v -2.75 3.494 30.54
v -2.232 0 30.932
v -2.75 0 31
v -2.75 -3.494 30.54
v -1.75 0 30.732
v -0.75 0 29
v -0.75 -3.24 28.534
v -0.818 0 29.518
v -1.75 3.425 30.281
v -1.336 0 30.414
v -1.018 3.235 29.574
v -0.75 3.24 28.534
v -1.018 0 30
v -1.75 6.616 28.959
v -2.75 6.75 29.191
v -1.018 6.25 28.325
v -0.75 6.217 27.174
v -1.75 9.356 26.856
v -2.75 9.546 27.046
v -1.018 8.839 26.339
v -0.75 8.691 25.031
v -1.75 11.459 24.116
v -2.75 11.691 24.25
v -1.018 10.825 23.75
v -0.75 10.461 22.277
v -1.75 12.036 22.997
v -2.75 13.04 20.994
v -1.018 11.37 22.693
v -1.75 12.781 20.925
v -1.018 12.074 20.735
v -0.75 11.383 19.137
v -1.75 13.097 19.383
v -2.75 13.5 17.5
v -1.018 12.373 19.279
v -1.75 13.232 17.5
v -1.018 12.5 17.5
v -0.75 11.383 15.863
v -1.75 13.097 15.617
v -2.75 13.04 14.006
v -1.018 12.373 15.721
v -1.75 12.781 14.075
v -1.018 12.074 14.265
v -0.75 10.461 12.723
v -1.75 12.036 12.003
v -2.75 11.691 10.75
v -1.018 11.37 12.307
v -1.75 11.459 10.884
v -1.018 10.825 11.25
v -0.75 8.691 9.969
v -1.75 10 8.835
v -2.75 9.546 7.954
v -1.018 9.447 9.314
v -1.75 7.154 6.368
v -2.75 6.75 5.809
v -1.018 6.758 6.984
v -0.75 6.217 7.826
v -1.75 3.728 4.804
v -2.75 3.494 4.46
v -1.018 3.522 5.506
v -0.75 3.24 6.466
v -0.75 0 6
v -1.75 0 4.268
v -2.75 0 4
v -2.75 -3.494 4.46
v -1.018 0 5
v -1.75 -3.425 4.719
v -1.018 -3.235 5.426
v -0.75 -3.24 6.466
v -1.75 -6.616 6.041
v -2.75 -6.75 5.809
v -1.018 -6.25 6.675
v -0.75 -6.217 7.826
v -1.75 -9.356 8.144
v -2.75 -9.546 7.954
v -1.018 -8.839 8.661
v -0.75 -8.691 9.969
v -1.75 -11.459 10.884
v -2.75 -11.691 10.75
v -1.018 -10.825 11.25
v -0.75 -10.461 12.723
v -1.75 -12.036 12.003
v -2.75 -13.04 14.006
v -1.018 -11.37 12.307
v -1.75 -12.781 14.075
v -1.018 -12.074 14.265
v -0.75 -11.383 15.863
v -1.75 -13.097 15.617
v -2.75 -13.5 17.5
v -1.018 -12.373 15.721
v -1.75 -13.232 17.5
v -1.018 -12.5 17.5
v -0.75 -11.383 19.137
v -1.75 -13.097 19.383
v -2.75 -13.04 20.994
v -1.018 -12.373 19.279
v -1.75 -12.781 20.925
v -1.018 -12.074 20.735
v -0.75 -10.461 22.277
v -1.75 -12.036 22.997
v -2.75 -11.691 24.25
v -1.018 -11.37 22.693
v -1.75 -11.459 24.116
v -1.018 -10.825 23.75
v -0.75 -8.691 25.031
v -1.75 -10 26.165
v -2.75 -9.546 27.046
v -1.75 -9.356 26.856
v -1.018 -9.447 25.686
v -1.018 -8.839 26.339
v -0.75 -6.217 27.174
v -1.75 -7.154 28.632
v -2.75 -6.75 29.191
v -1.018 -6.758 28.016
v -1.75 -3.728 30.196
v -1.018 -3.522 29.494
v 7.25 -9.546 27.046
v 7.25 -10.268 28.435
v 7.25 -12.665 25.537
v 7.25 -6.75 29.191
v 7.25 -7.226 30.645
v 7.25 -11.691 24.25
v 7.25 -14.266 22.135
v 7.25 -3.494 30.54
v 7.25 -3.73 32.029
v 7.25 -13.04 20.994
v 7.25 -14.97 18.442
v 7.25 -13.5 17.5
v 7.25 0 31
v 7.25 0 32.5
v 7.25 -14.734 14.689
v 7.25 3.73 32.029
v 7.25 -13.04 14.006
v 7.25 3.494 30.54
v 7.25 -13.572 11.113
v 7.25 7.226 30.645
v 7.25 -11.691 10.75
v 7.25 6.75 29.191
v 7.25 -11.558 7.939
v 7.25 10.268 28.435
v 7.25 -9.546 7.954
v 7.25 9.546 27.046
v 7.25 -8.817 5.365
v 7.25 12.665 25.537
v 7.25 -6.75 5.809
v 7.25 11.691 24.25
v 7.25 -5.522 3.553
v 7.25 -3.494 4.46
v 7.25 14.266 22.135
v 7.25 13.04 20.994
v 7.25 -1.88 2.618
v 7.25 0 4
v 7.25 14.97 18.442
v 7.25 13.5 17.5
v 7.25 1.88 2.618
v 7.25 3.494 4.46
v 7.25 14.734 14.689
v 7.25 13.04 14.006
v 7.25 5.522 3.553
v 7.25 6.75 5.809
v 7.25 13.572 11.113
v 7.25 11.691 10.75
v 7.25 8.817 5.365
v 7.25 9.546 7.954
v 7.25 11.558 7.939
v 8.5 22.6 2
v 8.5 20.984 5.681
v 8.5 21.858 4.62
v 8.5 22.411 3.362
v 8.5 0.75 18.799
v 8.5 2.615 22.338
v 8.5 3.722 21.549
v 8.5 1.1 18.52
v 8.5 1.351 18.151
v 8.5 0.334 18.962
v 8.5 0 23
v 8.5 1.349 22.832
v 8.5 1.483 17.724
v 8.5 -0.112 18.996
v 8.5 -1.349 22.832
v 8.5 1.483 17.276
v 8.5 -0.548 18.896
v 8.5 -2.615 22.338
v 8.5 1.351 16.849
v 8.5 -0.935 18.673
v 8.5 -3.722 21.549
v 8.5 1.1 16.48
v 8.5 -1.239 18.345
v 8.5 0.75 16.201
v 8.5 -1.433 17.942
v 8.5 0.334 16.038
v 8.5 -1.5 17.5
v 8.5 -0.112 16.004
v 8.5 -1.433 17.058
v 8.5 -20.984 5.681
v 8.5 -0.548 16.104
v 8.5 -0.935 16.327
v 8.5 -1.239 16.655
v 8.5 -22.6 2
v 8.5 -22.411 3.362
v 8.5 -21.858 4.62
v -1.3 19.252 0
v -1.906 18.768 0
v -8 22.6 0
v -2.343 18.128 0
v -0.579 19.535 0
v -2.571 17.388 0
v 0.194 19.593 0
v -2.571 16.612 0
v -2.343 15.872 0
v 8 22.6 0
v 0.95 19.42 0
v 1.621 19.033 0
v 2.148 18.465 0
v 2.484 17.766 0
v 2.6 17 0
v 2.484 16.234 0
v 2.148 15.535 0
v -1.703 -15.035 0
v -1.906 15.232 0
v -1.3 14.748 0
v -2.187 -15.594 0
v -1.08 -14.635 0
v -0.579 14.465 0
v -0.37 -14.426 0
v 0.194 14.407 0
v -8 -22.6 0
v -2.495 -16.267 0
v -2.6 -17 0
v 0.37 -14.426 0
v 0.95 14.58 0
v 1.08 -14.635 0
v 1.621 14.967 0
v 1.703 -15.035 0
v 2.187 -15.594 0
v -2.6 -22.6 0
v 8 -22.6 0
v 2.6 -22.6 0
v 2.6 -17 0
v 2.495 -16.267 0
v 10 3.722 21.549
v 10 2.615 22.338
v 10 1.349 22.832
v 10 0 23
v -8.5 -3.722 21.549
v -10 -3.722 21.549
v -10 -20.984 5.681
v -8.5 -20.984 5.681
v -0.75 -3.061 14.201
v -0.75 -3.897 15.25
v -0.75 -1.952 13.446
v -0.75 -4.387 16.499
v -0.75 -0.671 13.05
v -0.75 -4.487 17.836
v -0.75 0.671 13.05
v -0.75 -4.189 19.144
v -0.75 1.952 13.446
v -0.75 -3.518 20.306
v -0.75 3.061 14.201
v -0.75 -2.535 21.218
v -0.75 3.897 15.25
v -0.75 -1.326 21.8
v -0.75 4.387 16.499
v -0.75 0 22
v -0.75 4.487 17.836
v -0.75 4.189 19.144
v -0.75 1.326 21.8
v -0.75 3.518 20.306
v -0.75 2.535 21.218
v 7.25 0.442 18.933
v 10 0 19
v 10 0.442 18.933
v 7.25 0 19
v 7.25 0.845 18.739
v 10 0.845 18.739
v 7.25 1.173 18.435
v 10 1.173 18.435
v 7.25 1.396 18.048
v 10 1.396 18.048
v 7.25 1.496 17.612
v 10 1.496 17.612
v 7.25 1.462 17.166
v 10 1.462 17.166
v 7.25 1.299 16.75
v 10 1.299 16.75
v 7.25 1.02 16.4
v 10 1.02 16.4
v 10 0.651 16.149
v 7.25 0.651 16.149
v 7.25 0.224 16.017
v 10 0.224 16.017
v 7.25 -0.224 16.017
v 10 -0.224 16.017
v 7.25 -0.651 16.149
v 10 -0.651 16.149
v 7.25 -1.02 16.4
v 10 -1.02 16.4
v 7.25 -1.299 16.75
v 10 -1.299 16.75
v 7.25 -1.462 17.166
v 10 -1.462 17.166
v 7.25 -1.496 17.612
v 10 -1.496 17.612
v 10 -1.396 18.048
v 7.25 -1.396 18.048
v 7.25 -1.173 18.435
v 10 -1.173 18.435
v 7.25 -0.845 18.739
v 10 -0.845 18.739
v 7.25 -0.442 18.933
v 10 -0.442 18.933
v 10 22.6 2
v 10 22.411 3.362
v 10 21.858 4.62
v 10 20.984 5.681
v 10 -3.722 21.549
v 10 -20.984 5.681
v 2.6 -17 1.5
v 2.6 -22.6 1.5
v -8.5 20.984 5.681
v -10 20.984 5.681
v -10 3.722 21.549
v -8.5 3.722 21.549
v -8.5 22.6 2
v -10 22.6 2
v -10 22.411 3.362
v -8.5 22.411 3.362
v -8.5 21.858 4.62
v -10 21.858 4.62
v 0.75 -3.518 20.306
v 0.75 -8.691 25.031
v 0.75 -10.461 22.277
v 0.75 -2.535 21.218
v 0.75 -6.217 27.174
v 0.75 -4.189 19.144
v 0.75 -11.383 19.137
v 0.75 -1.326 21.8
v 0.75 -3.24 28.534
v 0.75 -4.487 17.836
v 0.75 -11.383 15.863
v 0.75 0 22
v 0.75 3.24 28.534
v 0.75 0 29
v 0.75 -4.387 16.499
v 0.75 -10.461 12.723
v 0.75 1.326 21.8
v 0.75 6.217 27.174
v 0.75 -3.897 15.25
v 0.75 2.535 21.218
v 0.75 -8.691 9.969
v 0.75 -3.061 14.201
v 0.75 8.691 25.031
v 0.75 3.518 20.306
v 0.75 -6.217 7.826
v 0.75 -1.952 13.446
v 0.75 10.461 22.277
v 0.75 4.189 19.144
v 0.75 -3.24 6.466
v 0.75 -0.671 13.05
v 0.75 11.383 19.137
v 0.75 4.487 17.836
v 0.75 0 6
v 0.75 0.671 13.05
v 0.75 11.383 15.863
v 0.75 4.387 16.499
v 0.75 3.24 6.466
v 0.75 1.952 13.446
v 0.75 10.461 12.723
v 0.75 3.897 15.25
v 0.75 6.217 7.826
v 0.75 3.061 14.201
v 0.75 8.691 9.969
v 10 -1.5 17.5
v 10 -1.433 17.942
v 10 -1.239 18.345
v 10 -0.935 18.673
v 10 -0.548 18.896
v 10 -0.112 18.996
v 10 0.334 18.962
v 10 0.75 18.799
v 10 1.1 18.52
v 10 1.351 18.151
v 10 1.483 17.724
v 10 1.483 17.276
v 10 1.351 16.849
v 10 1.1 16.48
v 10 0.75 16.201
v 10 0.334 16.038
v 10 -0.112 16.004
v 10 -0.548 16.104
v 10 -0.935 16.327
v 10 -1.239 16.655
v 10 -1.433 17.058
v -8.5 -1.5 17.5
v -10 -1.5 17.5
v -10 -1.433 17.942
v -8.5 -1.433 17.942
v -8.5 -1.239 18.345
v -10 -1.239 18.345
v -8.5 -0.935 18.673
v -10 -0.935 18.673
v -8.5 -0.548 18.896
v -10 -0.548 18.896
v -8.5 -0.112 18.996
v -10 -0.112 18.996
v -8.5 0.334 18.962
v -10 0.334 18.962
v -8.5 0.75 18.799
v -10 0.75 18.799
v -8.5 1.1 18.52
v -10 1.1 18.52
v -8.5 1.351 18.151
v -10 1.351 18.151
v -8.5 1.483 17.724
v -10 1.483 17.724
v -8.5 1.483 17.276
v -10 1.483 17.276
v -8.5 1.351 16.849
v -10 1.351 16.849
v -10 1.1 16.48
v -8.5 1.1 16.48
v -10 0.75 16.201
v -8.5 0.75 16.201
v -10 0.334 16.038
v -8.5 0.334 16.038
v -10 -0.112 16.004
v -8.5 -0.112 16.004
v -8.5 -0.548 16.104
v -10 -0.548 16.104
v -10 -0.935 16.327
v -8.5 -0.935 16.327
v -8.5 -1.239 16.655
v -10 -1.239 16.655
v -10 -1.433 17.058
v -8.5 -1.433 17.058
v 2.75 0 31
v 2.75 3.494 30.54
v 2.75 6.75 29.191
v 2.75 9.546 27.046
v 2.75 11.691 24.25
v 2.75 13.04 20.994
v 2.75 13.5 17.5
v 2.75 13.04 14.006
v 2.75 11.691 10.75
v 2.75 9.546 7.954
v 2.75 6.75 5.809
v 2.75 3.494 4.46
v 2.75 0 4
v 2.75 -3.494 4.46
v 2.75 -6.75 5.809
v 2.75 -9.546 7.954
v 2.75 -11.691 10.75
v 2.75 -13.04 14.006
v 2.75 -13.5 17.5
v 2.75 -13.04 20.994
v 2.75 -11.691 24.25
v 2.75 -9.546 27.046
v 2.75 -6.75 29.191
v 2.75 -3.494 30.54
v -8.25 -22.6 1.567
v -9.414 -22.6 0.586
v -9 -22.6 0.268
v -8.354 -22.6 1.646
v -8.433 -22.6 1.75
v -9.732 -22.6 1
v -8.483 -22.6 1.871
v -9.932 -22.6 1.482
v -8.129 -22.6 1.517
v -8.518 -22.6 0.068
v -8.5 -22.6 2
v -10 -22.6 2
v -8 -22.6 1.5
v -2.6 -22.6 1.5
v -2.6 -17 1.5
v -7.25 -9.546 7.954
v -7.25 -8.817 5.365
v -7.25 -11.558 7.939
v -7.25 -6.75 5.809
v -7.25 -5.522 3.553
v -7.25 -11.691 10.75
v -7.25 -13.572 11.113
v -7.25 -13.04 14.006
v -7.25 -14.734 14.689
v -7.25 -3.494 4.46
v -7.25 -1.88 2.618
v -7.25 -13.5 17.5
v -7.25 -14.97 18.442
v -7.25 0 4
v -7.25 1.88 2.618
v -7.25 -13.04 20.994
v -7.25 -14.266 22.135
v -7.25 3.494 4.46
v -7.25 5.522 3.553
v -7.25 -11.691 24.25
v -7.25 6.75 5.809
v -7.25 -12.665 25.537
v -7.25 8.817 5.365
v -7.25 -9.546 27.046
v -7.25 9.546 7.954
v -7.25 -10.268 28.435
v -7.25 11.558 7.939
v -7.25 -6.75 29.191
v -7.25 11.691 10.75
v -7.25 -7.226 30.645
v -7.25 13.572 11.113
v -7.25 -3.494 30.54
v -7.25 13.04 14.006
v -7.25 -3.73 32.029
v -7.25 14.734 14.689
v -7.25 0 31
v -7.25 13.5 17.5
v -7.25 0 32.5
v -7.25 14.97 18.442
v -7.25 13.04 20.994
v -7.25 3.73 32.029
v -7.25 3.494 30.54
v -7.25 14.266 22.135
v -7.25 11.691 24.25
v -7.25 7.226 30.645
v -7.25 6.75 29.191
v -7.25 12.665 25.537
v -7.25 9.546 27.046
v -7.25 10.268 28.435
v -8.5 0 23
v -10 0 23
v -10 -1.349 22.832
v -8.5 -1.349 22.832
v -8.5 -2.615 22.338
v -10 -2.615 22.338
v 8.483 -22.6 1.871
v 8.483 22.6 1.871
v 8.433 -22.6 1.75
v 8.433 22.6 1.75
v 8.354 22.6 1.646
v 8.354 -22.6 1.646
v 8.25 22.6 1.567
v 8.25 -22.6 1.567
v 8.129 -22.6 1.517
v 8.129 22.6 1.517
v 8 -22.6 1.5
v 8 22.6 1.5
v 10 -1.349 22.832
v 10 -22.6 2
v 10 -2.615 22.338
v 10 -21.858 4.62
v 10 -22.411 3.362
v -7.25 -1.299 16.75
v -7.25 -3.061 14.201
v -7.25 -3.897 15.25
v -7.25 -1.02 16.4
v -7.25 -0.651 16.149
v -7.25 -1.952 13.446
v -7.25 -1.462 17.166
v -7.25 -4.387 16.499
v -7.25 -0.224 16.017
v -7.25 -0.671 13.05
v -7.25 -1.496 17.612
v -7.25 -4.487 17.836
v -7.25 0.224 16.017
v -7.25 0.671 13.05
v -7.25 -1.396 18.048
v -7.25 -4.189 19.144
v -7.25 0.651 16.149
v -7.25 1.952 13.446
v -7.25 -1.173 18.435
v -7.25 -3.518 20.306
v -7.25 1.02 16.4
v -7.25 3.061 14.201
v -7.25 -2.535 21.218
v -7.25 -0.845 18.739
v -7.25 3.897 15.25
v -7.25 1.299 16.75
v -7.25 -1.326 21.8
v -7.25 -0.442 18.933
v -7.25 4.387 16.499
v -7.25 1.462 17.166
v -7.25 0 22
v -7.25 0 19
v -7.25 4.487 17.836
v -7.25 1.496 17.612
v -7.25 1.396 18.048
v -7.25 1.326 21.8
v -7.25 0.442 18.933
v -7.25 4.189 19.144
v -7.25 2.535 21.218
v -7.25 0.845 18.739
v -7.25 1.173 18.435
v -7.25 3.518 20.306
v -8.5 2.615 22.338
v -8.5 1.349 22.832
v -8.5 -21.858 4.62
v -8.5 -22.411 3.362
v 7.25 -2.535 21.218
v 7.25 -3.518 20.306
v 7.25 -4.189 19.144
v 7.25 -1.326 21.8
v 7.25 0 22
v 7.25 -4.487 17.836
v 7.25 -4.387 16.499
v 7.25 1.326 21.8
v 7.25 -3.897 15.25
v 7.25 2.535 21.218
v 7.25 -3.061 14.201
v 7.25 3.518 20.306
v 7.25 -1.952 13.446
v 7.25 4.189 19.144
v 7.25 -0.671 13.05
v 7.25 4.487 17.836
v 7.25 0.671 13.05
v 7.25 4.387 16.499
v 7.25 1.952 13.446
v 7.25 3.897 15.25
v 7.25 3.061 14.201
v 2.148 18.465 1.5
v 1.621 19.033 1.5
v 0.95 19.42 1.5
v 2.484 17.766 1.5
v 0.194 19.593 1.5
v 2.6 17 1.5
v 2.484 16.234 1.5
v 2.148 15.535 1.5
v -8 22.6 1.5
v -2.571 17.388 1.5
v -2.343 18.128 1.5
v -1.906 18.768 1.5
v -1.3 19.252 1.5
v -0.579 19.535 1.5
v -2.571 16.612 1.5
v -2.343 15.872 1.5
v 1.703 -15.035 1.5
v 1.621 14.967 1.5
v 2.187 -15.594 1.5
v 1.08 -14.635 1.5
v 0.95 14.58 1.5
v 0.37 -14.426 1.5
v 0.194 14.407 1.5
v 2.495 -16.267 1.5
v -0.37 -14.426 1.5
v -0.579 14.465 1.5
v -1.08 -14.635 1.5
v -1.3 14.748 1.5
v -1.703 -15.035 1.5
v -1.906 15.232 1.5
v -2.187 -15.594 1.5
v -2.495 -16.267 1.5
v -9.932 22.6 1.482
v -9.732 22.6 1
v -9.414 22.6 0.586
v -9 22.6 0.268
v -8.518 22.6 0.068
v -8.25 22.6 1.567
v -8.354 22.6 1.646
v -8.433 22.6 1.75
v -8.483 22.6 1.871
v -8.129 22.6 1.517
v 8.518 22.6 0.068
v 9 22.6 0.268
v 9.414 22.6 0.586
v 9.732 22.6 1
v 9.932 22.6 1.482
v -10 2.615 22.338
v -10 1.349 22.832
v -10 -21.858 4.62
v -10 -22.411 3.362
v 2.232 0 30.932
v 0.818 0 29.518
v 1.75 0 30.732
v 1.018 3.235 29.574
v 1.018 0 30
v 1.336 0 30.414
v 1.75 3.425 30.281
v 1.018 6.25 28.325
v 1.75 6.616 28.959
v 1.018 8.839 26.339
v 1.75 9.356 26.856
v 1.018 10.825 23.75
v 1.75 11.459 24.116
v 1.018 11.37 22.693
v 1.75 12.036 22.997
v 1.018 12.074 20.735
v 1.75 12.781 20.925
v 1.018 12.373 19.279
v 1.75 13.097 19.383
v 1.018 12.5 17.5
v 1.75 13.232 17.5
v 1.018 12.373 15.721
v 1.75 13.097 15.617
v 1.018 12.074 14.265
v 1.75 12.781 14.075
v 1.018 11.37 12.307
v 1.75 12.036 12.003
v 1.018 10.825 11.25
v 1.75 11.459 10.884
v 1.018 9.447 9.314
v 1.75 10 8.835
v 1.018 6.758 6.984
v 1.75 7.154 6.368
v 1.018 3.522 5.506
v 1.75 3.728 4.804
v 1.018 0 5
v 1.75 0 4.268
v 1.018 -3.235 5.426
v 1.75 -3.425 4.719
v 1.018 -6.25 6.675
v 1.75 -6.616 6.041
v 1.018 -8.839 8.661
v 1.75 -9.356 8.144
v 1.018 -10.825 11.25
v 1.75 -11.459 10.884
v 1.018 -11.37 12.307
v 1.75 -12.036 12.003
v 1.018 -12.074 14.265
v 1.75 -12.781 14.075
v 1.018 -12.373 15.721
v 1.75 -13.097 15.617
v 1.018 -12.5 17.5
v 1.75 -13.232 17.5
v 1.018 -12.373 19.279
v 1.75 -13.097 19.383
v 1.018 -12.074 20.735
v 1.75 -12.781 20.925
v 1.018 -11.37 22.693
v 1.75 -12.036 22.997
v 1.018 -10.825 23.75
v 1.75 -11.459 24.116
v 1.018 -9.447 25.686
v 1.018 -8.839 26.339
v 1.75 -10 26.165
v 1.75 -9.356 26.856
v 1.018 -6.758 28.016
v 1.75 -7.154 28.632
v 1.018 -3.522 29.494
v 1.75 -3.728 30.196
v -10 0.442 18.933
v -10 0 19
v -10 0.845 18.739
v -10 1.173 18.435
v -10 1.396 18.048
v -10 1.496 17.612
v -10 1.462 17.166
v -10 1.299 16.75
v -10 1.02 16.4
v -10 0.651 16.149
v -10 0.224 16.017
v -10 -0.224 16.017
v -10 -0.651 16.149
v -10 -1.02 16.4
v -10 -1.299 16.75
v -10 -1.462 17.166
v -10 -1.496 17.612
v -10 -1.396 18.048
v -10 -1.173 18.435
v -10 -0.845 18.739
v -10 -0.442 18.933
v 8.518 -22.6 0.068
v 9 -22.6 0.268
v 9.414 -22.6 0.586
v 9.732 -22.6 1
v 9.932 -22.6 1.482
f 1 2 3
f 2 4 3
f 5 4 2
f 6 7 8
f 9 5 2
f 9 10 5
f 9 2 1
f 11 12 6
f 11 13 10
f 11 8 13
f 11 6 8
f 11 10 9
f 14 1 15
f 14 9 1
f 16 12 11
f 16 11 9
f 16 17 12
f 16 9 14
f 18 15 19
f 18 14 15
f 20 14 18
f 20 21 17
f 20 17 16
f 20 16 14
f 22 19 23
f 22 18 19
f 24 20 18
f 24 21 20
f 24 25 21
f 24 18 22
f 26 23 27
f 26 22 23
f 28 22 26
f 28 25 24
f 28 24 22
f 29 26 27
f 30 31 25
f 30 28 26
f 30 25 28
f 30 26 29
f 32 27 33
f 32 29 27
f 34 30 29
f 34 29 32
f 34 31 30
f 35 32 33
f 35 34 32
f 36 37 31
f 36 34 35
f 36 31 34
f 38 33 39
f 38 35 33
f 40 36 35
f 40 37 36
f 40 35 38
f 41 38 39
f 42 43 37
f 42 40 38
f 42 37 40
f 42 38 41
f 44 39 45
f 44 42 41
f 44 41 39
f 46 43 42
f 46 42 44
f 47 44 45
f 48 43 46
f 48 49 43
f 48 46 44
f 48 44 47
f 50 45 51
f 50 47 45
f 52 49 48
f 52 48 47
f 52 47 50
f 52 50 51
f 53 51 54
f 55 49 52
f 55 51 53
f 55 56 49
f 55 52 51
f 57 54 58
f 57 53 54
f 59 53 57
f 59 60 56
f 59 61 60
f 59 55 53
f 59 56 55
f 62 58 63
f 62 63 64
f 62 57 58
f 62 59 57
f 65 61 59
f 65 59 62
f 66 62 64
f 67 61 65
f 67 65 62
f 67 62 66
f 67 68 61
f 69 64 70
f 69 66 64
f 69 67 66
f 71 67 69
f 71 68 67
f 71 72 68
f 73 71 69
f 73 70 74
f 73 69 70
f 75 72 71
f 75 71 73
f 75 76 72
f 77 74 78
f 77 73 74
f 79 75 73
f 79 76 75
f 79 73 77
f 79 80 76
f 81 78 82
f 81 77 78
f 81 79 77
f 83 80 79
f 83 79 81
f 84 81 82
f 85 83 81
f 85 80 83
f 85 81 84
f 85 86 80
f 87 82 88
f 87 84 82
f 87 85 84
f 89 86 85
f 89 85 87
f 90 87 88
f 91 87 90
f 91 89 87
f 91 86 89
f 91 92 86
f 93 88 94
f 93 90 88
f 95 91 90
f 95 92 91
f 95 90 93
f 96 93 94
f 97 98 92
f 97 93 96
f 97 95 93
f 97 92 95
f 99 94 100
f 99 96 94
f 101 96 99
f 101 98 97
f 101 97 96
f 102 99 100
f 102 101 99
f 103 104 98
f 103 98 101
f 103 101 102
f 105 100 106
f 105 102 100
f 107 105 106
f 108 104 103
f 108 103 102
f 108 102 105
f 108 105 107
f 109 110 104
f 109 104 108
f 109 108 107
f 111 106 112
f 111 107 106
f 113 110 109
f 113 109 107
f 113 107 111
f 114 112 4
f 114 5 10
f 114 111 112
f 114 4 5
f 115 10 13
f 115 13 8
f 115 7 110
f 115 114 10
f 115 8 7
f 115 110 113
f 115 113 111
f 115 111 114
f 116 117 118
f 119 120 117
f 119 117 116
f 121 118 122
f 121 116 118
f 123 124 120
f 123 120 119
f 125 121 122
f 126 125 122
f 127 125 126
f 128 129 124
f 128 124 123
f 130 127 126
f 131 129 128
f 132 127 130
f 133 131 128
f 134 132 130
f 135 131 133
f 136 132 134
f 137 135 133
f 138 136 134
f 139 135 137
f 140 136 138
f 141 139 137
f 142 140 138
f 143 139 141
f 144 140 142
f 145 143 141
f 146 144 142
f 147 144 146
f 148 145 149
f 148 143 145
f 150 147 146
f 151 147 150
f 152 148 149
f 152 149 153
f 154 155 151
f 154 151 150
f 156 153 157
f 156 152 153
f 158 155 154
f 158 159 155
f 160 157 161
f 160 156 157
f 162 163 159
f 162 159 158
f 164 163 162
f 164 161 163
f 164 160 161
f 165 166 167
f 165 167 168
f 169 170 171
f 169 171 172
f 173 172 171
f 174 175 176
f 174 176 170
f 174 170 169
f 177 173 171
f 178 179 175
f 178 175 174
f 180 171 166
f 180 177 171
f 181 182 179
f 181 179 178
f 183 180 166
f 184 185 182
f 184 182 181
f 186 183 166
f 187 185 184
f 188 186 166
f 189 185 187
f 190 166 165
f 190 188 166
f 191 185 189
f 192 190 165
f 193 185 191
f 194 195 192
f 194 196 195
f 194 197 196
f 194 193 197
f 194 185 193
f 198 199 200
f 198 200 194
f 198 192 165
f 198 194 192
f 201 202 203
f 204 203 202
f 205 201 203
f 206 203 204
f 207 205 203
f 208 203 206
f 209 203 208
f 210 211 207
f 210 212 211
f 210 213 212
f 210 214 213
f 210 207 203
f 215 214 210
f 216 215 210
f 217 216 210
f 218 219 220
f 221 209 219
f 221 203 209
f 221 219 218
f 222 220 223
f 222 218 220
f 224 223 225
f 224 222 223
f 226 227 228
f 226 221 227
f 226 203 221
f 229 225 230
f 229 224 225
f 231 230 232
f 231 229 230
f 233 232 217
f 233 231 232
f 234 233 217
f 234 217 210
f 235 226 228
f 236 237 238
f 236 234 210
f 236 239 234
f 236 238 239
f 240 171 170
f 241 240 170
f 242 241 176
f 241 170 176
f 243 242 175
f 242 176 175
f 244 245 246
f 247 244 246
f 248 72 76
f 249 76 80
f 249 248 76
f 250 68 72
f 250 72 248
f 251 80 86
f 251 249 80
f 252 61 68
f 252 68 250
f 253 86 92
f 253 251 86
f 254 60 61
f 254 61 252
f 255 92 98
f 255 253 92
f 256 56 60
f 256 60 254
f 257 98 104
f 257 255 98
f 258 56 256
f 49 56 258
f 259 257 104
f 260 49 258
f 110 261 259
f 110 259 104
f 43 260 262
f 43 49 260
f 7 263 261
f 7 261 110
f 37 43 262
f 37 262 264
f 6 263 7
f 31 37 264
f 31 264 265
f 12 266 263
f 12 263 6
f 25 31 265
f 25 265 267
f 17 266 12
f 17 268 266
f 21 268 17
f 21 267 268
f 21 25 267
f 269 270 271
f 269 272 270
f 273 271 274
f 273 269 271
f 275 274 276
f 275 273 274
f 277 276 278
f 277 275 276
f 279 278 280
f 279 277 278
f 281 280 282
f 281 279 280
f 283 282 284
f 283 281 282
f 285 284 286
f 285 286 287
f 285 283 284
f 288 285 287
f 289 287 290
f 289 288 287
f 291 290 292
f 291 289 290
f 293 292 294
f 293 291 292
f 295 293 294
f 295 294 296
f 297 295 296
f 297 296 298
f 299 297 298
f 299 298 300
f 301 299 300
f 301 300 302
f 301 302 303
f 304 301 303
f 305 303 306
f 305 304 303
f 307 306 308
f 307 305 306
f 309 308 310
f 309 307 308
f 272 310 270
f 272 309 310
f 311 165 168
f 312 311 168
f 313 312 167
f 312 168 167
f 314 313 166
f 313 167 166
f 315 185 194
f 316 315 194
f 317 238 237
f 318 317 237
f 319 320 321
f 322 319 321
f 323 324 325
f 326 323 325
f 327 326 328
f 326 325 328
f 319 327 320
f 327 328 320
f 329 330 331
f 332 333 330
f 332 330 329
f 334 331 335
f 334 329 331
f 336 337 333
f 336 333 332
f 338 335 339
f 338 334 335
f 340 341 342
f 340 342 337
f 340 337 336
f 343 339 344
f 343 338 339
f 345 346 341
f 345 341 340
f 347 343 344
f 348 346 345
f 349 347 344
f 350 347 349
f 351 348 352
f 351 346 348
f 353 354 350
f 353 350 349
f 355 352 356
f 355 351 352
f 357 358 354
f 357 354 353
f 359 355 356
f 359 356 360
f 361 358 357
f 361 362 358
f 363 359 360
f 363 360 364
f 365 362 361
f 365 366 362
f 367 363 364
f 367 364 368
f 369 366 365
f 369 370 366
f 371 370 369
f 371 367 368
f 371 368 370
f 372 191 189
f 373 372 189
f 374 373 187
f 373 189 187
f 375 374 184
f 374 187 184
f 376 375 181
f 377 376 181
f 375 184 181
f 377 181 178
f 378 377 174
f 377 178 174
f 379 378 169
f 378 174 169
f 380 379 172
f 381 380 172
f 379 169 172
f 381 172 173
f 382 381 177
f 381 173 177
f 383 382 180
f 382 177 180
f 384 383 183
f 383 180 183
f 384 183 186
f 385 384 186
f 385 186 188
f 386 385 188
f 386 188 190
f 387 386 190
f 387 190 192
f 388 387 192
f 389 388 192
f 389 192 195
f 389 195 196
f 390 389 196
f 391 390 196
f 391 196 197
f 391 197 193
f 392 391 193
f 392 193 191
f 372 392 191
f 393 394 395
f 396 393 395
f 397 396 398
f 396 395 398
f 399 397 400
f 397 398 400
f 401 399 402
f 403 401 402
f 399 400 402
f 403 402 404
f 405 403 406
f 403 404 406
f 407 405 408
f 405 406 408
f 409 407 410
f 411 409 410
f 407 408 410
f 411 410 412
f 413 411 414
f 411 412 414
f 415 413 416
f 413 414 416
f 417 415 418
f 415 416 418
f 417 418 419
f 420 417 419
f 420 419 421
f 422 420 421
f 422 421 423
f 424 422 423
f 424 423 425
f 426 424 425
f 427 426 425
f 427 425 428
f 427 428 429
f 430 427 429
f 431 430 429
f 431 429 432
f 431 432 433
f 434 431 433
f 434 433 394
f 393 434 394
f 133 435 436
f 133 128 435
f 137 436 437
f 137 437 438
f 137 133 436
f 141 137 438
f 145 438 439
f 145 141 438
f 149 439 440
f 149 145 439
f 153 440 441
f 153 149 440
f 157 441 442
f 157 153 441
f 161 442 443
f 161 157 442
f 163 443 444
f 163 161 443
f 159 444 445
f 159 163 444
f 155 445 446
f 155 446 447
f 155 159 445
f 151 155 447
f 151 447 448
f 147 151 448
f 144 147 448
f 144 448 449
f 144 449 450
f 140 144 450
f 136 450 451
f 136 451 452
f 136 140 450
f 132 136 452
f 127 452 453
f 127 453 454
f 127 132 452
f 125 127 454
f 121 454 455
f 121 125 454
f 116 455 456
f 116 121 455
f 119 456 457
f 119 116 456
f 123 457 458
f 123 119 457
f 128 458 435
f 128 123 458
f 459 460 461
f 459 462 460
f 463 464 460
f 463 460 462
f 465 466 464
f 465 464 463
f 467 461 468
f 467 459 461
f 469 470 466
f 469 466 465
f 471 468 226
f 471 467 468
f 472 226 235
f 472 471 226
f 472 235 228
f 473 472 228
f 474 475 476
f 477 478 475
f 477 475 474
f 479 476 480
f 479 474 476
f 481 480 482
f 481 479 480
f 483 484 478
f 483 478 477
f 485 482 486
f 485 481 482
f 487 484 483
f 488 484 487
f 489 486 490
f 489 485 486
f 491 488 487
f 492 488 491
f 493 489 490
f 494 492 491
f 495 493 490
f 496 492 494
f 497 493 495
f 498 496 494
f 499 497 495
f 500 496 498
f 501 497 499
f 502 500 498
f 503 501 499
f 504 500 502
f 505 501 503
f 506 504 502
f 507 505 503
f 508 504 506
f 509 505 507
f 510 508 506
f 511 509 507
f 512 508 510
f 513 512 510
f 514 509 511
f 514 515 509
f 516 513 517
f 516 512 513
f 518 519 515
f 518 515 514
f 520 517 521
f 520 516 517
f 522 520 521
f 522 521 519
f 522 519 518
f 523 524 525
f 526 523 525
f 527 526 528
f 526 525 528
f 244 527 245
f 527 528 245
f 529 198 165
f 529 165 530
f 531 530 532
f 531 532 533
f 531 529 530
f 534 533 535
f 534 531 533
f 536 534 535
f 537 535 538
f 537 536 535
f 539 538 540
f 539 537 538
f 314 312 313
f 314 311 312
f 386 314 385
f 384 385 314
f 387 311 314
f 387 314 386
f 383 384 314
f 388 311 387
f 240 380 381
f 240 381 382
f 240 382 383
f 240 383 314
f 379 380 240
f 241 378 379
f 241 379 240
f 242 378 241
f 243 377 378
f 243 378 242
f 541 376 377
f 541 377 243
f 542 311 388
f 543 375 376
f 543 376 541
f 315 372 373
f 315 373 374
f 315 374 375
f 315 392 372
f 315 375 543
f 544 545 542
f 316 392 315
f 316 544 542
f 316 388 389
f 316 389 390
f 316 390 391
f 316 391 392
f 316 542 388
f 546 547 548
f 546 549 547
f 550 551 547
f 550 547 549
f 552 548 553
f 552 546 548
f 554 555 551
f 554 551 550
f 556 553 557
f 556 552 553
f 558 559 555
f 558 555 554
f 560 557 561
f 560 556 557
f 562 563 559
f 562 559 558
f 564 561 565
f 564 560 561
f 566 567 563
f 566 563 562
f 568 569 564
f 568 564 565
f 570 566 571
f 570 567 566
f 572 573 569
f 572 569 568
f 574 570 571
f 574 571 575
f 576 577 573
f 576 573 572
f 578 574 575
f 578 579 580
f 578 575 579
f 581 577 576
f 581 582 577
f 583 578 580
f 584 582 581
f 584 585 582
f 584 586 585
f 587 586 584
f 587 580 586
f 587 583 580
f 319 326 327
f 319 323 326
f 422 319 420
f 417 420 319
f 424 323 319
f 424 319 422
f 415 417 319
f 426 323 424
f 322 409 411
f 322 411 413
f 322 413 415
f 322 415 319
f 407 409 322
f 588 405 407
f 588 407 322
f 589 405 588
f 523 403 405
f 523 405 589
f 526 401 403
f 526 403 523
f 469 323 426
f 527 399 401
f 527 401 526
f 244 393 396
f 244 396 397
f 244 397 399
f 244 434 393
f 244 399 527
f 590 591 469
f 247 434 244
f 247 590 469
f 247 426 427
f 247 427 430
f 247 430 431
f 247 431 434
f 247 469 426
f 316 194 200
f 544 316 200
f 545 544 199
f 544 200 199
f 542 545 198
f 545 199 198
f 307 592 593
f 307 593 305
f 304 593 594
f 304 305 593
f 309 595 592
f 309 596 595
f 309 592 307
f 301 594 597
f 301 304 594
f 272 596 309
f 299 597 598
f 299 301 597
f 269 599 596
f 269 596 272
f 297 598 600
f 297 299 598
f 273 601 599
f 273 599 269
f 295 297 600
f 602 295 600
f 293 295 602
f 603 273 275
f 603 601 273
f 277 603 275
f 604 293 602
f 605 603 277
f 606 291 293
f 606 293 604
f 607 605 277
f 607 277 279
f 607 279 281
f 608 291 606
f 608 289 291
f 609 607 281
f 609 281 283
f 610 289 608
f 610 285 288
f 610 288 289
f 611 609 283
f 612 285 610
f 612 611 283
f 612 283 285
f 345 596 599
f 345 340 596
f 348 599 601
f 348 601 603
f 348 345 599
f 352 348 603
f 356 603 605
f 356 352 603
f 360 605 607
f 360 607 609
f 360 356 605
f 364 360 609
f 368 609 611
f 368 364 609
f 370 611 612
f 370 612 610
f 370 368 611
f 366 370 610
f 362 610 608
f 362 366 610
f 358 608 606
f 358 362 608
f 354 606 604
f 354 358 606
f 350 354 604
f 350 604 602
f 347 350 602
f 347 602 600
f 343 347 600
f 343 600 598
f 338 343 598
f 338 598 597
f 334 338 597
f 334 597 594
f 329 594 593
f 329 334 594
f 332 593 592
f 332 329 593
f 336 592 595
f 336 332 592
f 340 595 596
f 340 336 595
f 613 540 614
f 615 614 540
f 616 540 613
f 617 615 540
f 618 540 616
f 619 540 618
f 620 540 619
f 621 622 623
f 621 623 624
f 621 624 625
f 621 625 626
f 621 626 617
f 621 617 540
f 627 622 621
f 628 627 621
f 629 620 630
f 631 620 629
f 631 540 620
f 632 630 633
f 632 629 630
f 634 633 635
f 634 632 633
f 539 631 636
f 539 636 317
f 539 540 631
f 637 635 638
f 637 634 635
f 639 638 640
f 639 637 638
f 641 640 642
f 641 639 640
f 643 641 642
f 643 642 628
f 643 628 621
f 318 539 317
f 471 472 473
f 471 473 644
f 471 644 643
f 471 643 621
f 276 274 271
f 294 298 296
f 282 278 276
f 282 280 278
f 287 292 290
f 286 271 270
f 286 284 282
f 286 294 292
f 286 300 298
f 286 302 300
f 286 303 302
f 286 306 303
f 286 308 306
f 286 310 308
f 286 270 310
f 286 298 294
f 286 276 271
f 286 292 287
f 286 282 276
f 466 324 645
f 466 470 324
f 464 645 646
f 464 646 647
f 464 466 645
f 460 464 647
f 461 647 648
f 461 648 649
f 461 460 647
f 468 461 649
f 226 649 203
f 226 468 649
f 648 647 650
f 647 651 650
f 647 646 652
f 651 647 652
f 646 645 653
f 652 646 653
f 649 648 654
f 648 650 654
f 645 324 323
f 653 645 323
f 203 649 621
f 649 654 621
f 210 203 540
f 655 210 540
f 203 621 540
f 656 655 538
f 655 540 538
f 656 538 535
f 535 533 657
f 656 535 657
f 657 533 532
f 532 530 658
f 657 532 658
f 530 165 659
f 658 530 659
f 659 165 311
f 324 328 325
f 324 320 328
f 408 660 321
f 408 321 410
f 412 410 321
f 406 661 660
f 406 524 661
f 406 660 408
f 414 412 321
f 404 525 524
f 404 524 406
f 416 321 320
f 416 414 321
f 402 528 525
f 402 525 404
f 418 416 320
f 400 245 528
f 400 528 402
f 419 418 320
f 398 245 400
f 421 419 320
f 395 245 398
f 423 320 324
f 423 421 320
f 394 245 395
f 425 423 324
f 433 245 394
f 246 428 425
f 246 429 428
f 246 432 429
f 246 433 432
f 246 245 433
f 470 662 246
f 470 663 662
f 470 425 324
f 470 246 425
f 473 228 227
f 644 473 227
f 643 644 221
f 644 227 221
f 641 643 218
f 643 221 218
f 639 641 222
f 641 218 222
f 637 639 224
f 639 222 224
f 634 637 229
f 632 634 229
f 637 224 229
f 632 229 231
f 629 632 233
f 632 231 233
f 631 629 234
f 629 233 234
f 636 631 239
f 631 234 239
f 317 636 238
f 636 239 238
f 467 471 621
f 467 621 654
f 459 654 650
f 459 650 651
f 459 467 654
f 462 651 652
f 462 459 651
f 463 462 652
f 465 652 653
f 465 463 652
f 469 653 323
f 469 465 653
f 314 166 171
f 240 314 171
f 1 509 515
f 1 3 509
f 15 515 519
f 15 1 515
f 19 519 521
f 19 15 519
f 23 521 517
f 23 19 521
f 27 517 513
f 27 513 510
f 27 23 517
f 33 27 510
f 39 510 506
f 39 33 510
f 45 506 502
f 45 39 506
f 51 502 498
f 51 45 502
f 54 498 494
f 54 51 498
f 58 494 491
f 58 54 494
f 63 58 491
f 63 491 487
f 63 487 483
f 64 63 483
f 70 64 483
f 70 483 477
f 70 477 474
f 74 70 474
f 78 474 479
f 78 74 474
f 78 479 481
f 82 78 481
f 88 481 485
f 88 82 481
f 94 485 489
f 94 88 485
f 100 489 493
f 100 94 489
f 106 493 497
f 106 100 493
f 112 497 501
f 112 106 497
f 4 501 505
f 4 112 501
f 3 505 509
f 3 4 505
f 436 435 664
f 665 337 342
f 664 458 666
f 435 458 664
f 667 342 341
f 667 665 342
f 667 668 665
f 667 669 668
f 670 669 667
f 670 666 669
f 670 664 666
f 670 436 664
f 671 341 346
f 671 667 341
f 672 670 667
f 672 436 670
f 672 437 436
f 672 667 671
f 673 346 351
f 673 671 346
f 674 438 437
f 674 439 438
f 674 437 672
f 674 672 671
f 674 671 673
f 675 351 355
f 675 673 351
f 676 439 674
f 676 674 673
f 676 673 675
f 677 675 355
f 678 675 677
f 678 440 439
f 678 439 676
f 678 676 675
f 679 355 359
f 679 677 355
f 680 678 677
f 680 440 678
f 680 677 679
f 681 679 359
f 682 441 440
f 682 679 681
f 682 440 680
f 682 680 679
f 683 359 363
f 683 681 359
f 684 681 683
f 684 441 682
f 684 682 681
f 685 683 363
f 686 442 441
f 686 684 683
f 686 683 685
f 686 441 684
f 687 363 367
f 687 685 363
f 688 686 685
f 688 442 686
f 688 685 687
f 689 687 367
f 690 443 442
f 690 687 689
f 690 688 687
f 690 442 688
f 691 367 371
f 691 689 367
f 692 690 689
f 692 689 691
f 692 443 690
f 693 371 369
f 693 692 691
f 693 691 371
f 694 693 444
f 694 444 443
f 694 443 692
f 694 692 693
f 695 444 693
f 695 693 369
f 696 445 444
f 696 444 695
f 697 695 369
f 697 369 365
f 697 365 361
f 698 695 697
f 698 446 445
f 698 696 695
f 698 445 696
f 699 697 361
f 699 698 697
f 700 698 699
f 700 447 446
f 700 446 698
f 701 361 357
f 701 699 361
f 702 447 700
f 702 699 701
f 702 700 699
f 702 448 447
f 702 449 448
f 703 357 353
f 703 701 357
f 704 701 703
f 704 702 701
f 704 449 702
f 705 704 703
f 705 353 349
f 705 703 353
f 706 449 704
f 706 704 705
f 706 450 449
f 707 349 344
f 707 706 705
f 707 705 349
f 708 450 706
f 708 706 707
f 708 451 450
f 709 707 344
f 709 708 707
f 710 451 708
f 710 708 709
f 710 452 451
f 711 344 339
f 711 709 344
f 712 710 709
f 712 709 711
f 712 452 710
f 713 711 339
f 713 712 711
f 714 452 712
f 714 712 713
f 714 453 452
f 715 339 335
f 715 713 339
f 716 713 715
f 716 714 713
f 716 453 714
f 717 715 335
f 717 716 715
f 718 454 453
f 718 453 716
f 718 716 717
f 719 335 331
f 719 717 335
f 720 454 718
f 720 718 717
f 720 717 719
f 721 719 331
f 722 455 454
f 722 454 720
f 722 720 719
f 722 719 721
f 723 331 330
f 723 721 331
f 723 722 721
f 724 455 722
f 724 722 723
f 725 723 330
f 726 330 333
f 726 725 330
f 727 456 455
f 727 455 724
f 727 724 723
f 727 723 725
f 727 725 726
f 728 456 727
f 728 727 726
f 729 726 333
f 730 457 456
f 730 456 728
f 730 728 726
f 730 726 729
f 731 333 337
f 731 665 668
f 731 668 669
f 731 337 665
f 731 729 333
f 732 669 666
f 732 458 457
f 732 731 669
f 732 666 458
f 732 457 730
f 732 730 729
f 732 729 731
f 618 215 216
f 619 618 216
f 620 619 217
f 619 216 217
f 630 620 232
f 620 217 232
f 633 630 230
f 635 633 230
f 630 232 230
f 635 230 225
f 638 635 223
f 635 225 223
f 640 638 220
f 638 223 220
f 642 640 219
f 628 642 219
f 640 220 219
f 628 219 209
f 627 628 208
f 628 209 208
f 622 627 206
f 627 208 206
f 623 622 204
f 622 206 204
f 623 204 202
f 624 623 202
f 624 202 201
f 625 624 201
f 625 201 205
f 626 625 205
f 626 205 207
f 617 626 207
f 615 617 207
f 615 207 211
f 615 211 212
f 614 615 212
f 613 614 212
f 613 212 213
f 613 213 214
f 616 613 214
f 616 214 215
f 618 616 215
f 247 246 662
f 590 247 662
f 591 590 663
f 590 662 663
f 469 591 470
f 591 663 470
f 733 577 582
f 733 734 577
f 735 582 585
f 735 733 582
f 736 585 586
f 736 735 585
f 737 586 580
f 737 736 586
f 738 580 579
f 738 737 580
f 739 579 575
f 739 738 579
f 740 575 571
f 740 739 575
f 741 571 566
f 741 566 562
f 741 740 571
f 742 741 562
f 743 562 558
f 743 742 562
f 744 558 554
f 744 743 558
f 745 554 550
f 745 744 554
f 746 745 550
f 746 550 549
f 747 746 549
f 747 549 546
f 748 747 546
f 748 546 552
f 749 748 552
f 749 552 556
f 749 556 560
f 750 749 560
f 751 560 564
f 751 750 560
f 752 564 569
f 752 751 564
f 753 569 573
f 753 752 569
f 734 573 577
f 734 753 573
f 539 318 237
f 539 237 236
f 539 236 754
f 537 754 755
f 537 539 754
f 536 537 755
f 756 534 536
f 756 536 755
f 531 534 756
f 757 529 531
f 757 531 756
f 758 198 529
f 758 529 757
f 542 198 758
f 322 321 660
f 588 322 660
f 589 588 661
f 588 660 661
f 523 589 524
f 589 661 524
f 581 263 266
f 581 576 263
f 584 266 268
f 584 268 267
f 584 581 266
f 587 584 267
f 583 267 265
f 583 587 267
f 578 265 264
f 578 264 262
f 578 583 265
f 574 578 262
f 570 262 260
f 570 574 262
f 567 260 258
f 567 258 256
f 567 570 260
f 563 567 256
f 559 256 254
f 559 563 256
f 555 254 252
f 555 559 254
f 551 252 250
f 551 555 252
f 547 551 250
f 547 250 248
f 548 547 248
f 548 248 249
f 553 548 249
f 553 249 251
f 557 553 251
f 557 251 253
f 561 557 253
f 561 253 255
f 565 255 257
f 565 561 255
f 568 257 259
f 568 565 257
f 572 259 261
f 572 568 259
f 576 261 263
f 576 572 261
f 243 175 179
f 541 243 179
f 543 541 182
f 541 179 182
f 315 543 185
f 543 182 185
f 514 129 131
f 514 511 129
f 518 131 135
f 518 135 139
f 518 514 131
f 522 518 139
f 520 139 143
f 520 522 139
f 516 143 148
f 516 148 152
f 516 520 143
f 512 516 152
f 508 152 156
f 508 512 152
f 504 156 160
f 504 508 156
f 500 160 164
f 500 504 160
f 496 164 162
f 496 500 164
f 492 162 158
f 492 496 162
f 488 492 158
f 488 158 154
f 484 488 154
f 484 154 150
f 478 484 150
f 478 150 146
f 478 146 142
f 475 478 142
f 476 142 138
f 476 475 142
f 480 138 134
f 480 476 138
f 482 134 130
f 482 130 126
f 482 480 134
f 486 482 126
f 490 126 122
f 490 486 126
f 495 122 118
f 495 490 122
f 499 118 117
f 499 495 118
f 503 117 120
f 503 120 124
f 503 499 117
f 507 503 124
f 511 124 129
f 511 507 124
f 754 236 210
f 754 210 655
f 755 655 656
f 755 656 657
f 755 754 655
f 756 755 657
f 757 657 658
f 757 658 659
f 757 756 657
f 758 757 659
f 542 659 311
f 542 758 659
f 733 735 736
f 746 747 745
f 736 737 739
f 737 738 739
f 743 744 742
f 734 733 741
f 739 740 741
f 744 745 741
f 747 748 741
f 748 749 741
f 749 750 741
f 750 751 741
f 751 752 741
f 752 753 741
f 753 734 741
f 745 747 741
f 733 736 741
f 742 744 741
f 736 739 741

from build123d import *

# Parameters (mm, degrees)
F0_W          = 1.5
F0_H          = 1.5
F0_H_2        = 4
F1_DEPTH      = 22.6
F1_DEPTH_BACK = 22.6
F2_R          = 1.5
F3_DEPTH      = 25
F4_R          = 2.6
F5_DEPTH      = 25


with BuildPart() as f1:
    # F0 (on Front) → F1 (new body, two sides)
    with BuildSketch(Plane.XZ) as f1_sk:
        with BuildLine():
            ThreePointArc((-10, 2), (-9.414214, 0.585786), (-8, 0))
            Line((-8, 0), (8, 0))
            ThreePointArc((8, 0), (9.414214, 0.585786), (10, 2))
            Line((10, 2), (10, 17.5))
            Line((10, 17.5), (8.5, 17.5))
            Line((8.5, 17.5), (8.5, 2))
            ThreePointArc((8.5, 2), (8.353553, 1.646447), (8, 1.5))
            Line((8, 1.5), (-8, 1.5))
            ThreePointArc((-8, 1.5), (-8.353553, 1.646447), (-8.5, 2))
            Line((-8.5, 2), (-8.5, 17.5))
            Line((-8.5, 17.5), (-10, 17.5))
            Line((-10, 17.5), (-10, 2))
        make_face()
        with Locations((-9.25, 18.25)):
            Rectangle(F0_W, F0_H)
        with Locations((-9.25, 21)):
            Rectangle(F0_W, F0_H_2)
        with Locations((9.25, 18.25)):
            Rectangle(F0_W, F0_H)
        with Locations((9.25, 21)):
            Rectangle(F0_W, F0_H_2)
    extrude(amount=F1_DEPTH)
    extrude(f1_sk.sketch, amount=-F1_DEPTH_BACK)

    # F2 (on face) → F3 (cut)
    with BuildSketch(Plane(origin=(-10, 0, 0), x_dir=(0, -1, 0), z_dir=(-1, 0, 0))):
        with BuildLine():
            ThreePointArc((0, 23), (1.997498, 22.624451), (3.722211, 21.549092))
            Line((3.722211, 21.549092), (20.983828, 5.680992))
            ThreePointArc((20.983828, 5.680992), (22.178162, 4.010082), (22.6, 2))
            Line((22.6, 2), (22.6, 23))
            Line((22.6, 23), (0, 23))
        make_face()
        with BuildLine():
            ThreePointArc((-3.722211, 21.549092), (-1.997498, 22.624451), (0, 23))
            Line((0, 23), (-22.6, 23))
            Line((-22.6, 23), (-22.6, 2))
            ThreePointArc((-22.6, 2), (-22.178162, 4.010082), (-20.983828, 5.680992))
            Line((-20.983828, 5.680992), (-3.722211, 21.549092))
        make_face()
        with Locations((0, 17.5)):
            Circle(F2_R)
    extrude(amount=-F3_DEPTH, mode=Mode.SUBTRACT)

    # F4 (on face) → F5 (cut)
    with BuildSketch(Plane(origin=(0, 0, 0), x_dir=(1, 0, 0), z_dir=(0, 0, -1))):
        with BuildLine():
            ThreePointArc((-2.6, 17), (0, 14.4), (2.6, 17))
            ThreePointArc((2.6, 17), (0, 19.6), (-2.6, 17))
        make_face()
        with BuildLine():
            ThreePointArc((-2.6, 17), (0, 19.6), (2.6, 17))
            Line((2.6, 17), (2.6, 22.6))
            Line((2.6, 22.6), (-2.6, 22.6))
            Line((-2.6, 22.6), (-2.6, 17))
        make_face()
        with Locations((0, -17)):
            Circle(F4_R)
    extrude(amount=-F5_DEPTH, mode=Mode.SUBTRACT)


with BuildPart() as f6:
    # F0 (on Front) → F6 (revolve)
    with BuildSketch(Plane.XZ):
        with BuildLine():
            Line((-8.5, 19), (-8.5, 17.5))
            Line((-8.5, 17.5), (0, 17.5))
            Line((0, 17.5), (8.5, 17.5))
            Line((8.5, 17.5), (8.5, 19))
            Line((8.5, 19), (7.25, 19))
            Line((7.25, 19), (7.25, 22))
            Line((7.25, 22), (0.75, 22))
            Line((0.75, 22), (0.75, 29))
            ThreePointArc((0.75, 29), (1.335786, 30.414214), (2.75, 31))
            Line((2.75, 31), (7.25, 31))
            Line((7.25, 31), (7.25, 32.5))
            Line((7.25, 32.5), (0, 32.5))
            Line((0, 32.5), (-7.25, 32.5))
            Line((-7.25, 32.5), (-7.25, 31))
            Line((-7.25, 31), (-2.75, 31))
            ThreePointArc((-2.75, 31), (-1.335786, 30.414214), (-0.75, 29))
            Line((-0.75, 29), (-0.75, 22))
            Line((-0.75, 22), (-7.25, 22))
            Line((-7.25, 22), (-7.25, 19))
            Line((-7.25, 19), (-8.5, 19))
        make_face()
        with Locations((9.25, 18.25)):
            Rectangle(F0_W, F0_H)
        with Locations((-9.25, 18.25)):
            Rectangle(F0_W, F0_H)
    revolve(axis=Axis((4.25, 0, 17.5), (-1, 0, 0)))


solid = Compound([f1.part, f6.part])
